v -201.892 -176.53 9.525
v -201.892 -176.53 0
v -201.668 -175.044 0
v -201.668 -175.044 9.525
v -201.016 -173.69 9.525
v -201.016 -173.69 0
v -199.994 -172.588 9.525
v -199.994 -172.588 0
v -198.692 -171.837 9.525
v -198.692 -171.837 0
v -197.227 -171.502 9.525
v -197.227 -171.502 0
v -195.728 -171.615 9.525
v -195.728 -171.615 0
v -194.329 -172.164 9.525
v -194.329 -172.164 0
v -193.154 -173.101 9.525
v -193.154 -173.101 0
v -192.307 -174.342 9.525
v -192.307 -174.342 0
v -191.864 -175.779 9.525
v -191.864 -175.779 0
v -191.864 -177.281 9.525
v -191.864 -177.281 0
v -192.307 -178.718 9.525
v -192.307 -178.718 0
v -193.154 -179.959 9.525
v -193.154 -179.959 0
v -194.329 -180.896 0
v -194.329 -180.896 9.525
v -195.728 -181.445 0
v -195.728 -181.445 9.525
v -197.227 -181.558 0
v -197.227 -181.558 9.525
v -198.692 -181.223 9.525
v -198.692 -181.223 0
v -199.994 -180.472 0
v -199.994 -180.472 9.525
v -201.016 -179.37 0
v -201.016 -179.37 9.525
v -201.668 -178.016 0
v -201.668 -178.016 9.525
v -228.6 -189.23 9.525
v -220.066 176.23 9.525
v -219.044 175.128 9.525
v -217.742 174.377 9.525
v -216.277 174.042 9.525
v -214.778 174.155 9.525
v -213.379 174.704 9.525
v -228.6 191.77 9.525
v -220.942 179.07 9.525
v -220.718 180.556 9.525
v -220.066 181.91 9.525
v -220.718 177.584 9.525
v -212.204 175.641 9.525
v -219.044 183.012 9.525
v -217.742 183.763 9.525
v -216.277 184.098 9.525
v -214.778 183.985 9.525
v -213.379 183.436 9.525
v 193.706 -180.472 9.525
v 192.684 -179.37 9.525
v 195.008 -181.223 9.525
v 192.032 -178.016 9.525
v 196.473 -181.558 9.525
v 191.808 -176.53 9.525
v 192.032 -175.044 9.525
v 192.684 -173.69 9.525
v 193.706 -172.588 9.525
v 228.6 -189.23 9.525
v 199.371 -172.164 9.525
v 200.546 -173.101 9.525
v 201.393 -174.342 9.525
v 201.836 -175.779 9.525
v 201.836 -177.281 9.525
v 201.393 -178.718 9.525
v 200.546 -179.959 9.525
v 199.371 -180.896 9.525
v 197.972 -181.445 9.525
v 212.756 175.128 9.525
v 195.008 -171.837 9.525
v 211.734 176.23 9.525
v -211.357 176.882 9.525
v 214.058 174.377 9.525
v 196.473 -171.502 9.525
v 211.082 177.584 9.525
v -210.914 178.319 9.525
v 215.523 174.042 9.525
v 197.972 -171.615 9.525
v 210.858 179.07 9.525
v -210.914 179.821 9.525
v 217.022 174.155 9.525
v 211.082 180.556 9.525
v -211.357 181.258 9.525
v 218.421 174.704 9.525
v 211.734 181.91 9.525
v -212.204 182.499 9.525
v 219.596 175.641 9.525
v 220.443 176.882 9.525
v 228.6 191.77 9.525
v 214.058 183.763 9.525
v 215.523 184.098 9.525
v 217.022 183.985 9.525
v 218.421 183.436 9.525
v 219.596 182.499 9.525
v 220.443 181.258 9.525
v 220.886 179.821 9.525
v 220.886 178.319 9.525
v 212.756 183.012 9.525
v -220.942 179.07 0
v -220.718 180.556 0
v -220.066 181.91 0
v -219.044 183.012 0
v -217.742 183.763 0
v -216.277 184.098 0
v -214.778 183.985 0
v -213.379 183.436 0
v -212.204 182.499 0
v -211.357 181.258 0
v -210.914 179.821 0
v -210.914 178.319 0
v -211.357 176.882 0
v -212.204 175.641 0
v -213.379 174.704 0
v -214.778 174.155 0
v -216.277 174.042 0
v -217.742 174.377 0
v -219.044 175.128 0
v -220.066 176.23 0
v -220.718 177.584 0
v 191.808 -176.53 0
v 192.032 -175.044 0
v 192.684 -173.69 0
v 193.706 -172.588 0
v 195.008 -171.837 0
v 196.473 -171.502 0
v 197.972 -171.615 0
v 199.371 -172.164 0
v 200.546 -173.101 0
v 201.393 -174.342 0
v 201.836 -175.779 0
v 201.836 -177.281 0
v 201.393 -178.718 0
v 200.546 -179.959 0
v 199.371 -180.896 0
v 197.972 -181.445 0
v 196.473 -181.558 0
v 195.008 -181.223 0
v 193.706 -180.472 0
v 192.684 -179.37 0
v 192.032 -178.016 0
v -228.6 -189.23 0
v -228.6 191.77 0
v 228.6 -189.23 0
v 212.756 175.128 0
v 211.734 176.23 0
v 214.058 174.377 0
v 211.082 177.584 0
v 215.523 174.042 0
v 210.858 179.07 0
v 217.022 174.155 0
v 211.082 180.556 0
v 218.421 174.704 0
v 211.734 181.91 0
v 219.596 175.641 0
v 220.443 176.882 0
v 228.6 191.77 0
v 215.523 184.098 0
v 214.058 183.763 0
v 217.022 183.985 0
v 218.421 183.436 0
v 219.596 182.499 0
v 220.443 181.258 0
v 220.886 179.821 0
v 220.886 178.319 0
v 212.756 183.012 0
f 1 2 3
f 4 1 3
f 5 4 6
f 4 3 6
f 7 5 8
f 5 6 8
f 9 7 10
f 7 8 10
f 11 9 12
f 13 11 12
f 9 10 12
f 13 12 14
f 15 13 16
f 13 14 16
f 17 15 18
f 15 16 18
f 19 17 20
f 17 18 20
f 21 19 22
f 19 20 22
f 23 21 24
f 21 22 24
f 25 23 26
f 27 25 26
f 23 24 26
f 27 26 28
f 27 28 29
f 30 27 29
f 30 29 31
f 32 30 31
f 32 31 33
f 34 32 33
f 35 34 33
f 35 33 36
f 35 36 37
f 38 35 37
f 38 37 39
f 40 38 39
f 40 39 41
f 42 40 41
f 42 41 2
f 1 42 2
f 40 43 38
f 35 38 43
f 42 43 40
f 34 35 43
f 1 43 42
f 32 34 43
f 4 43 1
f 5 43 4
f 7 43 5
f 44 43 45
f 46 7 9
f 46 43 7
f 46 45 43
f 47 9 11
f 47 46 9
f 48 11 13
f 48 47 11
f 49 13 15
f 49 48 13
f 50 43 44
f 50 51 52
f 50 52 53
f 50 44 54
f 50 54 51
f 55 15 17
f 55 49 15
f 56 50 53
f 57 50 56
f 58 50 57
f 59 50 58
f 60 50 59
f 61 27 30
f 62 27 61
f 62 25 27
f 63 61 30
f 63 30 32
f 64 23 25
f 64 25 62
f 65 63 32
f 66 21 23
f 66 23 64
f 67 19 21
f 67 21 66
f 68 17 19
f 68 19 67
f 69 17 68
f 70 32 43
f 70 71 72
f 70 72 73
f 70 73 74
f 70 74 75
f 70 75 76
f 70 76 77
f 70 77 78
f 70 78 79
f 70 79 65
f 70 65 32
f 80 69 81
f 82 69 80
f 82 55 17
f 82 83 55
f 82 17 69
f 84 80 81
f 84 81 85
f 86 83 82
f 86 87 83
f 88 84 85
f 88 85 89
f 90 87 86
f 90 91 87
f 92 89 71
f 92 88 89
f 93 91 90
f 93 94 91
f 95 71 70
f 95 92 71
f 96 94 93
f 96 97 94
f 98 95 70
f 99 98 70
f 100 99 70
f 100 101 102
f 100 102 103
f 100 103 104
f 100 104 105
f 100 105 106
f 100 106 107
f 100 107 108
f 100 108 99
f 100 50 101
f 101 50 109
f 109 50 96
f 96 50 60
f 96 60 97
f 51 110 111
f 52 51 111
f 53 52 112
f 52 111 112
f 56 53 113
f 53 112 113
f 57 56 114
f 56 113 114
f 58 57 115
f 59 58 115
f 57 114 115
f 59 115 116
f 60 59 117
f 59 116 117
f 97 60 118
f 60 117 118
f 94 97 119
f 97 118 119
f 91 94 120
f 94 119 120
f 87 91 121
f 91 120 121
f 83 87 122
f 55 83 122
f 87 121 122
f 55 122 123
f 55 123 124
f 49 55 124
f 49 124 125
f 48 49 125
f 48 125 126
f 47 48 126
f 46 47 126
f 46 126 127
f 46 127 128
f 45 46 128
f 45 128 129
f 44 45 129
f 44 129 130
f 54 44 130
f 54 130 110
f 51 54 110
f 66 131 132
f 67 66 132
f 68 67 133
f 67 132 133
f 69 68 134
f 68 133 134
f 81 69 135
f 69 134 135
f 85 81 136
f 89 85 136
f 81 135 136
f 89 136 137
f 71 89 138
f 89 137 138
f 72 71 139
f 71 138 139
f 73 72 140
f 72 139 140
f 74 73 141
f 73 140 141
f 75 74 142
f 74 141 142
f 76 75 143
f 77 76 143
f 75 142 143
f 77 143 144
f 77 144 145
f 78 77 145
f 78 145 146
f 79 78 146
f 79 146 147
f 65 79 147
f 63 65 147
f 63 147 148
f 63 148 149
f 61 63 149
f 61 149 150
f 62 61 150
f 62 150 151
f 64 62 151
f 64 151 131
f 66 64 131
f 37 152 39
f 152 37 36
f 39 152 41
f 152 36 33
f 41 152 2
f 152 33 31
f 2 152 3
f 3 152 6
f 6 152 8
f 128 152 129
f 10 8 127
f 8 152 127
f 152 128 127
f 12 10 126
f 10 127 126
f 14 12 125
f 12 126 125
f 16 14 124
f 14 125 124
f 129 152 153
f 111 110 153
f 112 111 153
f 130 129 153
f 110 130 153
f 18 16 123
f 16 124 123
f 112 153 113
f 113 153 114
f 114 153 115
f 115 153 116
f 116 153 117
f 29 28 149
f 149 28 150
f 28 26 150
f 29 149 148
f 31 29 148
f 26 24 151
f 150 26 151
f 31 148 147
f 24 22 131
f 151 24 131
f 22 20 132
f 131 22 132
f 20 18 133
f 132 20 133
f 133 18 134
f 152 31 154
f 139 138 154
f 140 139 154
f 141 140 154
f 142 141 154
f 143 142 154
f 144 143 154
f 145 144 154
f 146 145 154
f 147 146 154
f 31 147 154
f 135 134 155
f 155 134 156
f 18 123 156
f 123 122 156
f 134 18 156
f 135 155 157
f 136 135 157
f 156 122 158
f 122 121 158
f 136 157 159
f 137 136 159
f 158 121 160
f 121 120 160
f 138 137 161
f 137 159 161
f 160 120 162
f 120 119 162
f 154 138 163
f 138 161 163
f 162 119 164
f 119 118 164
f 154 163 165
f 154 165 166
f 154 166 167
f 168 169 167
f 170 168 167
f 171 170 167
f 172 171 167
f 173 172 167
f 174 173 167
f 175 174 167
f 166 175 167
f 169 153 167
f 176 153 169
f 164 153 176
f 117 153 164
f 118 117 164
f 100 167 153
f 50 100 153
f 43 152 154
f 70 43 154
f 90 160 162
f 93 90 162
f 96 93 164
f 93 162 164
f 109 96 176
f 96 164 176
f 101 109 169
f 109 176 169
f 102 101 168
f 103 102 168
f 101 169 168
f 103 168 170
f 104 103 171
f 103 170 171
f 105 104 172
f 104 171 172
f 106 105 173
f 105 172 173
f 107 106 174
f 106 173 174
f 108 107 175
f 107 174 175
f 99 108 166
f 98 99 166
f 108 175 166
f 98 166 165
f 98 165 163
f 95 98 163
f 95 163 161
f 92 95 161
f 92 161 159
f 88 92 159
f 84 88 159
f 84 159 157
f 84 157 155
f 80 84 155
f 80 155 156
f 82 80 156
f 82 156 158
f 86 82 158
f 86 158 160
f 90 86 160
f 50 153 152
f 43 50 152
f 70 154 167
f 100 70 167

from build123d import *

# Parameters (mm, degrees)
BOSS_EXTRUDE1_DEPTH         = 9.525
F_3_8_CLEARANCE_HOLE1_D     = 10.0838
F_3_8_CLEARANCE_HOLE1_DEPTH = 25.4
F_3_8_CLEARANCE_HOLE1_TIP   = 3.029479155


with BuildPart() as part:
    # Sketch1 → Boss-Extrude1 (new body)
    with BuildSketch(Plane.XY):
        Polygon((-228.6, -36.83), (-228.6, -189.23), (228.6, -189.23), (228.6, -36.83), (228.6, 191.77), (-228.6, 191.77), align=None)
    extrude(amount=BOSS_EXTRUDE1_DEPTH)

    # 3/8 Clearance Hole1
    with Locations(Plane.XY.offset(9.525)):
        with Locations((-215.9, 179.07), (215.9, 179.07), (196.85, -176.53), (-196.85, -176.53)):
            Hole(F_3_8_CLEARANCE_HOLE1_D / 2, depth=F_3_8_CLEARANCE_HOLE1_DEPTH)
            with Locations((0, 0, -(F_3_8_CLEARANCE_HOLE1_DEPTH + F_3_8_CLEARANCE_HOLE1_TIP / 2))):  # 118° drill point
                Cone(0, F_3_8_CLEARANCE_HOLE1_D / 2, F_3_8_CLEARANCE_HOLE1_TIP, mode=Mode.SUBTRACT)


solid = part.part
